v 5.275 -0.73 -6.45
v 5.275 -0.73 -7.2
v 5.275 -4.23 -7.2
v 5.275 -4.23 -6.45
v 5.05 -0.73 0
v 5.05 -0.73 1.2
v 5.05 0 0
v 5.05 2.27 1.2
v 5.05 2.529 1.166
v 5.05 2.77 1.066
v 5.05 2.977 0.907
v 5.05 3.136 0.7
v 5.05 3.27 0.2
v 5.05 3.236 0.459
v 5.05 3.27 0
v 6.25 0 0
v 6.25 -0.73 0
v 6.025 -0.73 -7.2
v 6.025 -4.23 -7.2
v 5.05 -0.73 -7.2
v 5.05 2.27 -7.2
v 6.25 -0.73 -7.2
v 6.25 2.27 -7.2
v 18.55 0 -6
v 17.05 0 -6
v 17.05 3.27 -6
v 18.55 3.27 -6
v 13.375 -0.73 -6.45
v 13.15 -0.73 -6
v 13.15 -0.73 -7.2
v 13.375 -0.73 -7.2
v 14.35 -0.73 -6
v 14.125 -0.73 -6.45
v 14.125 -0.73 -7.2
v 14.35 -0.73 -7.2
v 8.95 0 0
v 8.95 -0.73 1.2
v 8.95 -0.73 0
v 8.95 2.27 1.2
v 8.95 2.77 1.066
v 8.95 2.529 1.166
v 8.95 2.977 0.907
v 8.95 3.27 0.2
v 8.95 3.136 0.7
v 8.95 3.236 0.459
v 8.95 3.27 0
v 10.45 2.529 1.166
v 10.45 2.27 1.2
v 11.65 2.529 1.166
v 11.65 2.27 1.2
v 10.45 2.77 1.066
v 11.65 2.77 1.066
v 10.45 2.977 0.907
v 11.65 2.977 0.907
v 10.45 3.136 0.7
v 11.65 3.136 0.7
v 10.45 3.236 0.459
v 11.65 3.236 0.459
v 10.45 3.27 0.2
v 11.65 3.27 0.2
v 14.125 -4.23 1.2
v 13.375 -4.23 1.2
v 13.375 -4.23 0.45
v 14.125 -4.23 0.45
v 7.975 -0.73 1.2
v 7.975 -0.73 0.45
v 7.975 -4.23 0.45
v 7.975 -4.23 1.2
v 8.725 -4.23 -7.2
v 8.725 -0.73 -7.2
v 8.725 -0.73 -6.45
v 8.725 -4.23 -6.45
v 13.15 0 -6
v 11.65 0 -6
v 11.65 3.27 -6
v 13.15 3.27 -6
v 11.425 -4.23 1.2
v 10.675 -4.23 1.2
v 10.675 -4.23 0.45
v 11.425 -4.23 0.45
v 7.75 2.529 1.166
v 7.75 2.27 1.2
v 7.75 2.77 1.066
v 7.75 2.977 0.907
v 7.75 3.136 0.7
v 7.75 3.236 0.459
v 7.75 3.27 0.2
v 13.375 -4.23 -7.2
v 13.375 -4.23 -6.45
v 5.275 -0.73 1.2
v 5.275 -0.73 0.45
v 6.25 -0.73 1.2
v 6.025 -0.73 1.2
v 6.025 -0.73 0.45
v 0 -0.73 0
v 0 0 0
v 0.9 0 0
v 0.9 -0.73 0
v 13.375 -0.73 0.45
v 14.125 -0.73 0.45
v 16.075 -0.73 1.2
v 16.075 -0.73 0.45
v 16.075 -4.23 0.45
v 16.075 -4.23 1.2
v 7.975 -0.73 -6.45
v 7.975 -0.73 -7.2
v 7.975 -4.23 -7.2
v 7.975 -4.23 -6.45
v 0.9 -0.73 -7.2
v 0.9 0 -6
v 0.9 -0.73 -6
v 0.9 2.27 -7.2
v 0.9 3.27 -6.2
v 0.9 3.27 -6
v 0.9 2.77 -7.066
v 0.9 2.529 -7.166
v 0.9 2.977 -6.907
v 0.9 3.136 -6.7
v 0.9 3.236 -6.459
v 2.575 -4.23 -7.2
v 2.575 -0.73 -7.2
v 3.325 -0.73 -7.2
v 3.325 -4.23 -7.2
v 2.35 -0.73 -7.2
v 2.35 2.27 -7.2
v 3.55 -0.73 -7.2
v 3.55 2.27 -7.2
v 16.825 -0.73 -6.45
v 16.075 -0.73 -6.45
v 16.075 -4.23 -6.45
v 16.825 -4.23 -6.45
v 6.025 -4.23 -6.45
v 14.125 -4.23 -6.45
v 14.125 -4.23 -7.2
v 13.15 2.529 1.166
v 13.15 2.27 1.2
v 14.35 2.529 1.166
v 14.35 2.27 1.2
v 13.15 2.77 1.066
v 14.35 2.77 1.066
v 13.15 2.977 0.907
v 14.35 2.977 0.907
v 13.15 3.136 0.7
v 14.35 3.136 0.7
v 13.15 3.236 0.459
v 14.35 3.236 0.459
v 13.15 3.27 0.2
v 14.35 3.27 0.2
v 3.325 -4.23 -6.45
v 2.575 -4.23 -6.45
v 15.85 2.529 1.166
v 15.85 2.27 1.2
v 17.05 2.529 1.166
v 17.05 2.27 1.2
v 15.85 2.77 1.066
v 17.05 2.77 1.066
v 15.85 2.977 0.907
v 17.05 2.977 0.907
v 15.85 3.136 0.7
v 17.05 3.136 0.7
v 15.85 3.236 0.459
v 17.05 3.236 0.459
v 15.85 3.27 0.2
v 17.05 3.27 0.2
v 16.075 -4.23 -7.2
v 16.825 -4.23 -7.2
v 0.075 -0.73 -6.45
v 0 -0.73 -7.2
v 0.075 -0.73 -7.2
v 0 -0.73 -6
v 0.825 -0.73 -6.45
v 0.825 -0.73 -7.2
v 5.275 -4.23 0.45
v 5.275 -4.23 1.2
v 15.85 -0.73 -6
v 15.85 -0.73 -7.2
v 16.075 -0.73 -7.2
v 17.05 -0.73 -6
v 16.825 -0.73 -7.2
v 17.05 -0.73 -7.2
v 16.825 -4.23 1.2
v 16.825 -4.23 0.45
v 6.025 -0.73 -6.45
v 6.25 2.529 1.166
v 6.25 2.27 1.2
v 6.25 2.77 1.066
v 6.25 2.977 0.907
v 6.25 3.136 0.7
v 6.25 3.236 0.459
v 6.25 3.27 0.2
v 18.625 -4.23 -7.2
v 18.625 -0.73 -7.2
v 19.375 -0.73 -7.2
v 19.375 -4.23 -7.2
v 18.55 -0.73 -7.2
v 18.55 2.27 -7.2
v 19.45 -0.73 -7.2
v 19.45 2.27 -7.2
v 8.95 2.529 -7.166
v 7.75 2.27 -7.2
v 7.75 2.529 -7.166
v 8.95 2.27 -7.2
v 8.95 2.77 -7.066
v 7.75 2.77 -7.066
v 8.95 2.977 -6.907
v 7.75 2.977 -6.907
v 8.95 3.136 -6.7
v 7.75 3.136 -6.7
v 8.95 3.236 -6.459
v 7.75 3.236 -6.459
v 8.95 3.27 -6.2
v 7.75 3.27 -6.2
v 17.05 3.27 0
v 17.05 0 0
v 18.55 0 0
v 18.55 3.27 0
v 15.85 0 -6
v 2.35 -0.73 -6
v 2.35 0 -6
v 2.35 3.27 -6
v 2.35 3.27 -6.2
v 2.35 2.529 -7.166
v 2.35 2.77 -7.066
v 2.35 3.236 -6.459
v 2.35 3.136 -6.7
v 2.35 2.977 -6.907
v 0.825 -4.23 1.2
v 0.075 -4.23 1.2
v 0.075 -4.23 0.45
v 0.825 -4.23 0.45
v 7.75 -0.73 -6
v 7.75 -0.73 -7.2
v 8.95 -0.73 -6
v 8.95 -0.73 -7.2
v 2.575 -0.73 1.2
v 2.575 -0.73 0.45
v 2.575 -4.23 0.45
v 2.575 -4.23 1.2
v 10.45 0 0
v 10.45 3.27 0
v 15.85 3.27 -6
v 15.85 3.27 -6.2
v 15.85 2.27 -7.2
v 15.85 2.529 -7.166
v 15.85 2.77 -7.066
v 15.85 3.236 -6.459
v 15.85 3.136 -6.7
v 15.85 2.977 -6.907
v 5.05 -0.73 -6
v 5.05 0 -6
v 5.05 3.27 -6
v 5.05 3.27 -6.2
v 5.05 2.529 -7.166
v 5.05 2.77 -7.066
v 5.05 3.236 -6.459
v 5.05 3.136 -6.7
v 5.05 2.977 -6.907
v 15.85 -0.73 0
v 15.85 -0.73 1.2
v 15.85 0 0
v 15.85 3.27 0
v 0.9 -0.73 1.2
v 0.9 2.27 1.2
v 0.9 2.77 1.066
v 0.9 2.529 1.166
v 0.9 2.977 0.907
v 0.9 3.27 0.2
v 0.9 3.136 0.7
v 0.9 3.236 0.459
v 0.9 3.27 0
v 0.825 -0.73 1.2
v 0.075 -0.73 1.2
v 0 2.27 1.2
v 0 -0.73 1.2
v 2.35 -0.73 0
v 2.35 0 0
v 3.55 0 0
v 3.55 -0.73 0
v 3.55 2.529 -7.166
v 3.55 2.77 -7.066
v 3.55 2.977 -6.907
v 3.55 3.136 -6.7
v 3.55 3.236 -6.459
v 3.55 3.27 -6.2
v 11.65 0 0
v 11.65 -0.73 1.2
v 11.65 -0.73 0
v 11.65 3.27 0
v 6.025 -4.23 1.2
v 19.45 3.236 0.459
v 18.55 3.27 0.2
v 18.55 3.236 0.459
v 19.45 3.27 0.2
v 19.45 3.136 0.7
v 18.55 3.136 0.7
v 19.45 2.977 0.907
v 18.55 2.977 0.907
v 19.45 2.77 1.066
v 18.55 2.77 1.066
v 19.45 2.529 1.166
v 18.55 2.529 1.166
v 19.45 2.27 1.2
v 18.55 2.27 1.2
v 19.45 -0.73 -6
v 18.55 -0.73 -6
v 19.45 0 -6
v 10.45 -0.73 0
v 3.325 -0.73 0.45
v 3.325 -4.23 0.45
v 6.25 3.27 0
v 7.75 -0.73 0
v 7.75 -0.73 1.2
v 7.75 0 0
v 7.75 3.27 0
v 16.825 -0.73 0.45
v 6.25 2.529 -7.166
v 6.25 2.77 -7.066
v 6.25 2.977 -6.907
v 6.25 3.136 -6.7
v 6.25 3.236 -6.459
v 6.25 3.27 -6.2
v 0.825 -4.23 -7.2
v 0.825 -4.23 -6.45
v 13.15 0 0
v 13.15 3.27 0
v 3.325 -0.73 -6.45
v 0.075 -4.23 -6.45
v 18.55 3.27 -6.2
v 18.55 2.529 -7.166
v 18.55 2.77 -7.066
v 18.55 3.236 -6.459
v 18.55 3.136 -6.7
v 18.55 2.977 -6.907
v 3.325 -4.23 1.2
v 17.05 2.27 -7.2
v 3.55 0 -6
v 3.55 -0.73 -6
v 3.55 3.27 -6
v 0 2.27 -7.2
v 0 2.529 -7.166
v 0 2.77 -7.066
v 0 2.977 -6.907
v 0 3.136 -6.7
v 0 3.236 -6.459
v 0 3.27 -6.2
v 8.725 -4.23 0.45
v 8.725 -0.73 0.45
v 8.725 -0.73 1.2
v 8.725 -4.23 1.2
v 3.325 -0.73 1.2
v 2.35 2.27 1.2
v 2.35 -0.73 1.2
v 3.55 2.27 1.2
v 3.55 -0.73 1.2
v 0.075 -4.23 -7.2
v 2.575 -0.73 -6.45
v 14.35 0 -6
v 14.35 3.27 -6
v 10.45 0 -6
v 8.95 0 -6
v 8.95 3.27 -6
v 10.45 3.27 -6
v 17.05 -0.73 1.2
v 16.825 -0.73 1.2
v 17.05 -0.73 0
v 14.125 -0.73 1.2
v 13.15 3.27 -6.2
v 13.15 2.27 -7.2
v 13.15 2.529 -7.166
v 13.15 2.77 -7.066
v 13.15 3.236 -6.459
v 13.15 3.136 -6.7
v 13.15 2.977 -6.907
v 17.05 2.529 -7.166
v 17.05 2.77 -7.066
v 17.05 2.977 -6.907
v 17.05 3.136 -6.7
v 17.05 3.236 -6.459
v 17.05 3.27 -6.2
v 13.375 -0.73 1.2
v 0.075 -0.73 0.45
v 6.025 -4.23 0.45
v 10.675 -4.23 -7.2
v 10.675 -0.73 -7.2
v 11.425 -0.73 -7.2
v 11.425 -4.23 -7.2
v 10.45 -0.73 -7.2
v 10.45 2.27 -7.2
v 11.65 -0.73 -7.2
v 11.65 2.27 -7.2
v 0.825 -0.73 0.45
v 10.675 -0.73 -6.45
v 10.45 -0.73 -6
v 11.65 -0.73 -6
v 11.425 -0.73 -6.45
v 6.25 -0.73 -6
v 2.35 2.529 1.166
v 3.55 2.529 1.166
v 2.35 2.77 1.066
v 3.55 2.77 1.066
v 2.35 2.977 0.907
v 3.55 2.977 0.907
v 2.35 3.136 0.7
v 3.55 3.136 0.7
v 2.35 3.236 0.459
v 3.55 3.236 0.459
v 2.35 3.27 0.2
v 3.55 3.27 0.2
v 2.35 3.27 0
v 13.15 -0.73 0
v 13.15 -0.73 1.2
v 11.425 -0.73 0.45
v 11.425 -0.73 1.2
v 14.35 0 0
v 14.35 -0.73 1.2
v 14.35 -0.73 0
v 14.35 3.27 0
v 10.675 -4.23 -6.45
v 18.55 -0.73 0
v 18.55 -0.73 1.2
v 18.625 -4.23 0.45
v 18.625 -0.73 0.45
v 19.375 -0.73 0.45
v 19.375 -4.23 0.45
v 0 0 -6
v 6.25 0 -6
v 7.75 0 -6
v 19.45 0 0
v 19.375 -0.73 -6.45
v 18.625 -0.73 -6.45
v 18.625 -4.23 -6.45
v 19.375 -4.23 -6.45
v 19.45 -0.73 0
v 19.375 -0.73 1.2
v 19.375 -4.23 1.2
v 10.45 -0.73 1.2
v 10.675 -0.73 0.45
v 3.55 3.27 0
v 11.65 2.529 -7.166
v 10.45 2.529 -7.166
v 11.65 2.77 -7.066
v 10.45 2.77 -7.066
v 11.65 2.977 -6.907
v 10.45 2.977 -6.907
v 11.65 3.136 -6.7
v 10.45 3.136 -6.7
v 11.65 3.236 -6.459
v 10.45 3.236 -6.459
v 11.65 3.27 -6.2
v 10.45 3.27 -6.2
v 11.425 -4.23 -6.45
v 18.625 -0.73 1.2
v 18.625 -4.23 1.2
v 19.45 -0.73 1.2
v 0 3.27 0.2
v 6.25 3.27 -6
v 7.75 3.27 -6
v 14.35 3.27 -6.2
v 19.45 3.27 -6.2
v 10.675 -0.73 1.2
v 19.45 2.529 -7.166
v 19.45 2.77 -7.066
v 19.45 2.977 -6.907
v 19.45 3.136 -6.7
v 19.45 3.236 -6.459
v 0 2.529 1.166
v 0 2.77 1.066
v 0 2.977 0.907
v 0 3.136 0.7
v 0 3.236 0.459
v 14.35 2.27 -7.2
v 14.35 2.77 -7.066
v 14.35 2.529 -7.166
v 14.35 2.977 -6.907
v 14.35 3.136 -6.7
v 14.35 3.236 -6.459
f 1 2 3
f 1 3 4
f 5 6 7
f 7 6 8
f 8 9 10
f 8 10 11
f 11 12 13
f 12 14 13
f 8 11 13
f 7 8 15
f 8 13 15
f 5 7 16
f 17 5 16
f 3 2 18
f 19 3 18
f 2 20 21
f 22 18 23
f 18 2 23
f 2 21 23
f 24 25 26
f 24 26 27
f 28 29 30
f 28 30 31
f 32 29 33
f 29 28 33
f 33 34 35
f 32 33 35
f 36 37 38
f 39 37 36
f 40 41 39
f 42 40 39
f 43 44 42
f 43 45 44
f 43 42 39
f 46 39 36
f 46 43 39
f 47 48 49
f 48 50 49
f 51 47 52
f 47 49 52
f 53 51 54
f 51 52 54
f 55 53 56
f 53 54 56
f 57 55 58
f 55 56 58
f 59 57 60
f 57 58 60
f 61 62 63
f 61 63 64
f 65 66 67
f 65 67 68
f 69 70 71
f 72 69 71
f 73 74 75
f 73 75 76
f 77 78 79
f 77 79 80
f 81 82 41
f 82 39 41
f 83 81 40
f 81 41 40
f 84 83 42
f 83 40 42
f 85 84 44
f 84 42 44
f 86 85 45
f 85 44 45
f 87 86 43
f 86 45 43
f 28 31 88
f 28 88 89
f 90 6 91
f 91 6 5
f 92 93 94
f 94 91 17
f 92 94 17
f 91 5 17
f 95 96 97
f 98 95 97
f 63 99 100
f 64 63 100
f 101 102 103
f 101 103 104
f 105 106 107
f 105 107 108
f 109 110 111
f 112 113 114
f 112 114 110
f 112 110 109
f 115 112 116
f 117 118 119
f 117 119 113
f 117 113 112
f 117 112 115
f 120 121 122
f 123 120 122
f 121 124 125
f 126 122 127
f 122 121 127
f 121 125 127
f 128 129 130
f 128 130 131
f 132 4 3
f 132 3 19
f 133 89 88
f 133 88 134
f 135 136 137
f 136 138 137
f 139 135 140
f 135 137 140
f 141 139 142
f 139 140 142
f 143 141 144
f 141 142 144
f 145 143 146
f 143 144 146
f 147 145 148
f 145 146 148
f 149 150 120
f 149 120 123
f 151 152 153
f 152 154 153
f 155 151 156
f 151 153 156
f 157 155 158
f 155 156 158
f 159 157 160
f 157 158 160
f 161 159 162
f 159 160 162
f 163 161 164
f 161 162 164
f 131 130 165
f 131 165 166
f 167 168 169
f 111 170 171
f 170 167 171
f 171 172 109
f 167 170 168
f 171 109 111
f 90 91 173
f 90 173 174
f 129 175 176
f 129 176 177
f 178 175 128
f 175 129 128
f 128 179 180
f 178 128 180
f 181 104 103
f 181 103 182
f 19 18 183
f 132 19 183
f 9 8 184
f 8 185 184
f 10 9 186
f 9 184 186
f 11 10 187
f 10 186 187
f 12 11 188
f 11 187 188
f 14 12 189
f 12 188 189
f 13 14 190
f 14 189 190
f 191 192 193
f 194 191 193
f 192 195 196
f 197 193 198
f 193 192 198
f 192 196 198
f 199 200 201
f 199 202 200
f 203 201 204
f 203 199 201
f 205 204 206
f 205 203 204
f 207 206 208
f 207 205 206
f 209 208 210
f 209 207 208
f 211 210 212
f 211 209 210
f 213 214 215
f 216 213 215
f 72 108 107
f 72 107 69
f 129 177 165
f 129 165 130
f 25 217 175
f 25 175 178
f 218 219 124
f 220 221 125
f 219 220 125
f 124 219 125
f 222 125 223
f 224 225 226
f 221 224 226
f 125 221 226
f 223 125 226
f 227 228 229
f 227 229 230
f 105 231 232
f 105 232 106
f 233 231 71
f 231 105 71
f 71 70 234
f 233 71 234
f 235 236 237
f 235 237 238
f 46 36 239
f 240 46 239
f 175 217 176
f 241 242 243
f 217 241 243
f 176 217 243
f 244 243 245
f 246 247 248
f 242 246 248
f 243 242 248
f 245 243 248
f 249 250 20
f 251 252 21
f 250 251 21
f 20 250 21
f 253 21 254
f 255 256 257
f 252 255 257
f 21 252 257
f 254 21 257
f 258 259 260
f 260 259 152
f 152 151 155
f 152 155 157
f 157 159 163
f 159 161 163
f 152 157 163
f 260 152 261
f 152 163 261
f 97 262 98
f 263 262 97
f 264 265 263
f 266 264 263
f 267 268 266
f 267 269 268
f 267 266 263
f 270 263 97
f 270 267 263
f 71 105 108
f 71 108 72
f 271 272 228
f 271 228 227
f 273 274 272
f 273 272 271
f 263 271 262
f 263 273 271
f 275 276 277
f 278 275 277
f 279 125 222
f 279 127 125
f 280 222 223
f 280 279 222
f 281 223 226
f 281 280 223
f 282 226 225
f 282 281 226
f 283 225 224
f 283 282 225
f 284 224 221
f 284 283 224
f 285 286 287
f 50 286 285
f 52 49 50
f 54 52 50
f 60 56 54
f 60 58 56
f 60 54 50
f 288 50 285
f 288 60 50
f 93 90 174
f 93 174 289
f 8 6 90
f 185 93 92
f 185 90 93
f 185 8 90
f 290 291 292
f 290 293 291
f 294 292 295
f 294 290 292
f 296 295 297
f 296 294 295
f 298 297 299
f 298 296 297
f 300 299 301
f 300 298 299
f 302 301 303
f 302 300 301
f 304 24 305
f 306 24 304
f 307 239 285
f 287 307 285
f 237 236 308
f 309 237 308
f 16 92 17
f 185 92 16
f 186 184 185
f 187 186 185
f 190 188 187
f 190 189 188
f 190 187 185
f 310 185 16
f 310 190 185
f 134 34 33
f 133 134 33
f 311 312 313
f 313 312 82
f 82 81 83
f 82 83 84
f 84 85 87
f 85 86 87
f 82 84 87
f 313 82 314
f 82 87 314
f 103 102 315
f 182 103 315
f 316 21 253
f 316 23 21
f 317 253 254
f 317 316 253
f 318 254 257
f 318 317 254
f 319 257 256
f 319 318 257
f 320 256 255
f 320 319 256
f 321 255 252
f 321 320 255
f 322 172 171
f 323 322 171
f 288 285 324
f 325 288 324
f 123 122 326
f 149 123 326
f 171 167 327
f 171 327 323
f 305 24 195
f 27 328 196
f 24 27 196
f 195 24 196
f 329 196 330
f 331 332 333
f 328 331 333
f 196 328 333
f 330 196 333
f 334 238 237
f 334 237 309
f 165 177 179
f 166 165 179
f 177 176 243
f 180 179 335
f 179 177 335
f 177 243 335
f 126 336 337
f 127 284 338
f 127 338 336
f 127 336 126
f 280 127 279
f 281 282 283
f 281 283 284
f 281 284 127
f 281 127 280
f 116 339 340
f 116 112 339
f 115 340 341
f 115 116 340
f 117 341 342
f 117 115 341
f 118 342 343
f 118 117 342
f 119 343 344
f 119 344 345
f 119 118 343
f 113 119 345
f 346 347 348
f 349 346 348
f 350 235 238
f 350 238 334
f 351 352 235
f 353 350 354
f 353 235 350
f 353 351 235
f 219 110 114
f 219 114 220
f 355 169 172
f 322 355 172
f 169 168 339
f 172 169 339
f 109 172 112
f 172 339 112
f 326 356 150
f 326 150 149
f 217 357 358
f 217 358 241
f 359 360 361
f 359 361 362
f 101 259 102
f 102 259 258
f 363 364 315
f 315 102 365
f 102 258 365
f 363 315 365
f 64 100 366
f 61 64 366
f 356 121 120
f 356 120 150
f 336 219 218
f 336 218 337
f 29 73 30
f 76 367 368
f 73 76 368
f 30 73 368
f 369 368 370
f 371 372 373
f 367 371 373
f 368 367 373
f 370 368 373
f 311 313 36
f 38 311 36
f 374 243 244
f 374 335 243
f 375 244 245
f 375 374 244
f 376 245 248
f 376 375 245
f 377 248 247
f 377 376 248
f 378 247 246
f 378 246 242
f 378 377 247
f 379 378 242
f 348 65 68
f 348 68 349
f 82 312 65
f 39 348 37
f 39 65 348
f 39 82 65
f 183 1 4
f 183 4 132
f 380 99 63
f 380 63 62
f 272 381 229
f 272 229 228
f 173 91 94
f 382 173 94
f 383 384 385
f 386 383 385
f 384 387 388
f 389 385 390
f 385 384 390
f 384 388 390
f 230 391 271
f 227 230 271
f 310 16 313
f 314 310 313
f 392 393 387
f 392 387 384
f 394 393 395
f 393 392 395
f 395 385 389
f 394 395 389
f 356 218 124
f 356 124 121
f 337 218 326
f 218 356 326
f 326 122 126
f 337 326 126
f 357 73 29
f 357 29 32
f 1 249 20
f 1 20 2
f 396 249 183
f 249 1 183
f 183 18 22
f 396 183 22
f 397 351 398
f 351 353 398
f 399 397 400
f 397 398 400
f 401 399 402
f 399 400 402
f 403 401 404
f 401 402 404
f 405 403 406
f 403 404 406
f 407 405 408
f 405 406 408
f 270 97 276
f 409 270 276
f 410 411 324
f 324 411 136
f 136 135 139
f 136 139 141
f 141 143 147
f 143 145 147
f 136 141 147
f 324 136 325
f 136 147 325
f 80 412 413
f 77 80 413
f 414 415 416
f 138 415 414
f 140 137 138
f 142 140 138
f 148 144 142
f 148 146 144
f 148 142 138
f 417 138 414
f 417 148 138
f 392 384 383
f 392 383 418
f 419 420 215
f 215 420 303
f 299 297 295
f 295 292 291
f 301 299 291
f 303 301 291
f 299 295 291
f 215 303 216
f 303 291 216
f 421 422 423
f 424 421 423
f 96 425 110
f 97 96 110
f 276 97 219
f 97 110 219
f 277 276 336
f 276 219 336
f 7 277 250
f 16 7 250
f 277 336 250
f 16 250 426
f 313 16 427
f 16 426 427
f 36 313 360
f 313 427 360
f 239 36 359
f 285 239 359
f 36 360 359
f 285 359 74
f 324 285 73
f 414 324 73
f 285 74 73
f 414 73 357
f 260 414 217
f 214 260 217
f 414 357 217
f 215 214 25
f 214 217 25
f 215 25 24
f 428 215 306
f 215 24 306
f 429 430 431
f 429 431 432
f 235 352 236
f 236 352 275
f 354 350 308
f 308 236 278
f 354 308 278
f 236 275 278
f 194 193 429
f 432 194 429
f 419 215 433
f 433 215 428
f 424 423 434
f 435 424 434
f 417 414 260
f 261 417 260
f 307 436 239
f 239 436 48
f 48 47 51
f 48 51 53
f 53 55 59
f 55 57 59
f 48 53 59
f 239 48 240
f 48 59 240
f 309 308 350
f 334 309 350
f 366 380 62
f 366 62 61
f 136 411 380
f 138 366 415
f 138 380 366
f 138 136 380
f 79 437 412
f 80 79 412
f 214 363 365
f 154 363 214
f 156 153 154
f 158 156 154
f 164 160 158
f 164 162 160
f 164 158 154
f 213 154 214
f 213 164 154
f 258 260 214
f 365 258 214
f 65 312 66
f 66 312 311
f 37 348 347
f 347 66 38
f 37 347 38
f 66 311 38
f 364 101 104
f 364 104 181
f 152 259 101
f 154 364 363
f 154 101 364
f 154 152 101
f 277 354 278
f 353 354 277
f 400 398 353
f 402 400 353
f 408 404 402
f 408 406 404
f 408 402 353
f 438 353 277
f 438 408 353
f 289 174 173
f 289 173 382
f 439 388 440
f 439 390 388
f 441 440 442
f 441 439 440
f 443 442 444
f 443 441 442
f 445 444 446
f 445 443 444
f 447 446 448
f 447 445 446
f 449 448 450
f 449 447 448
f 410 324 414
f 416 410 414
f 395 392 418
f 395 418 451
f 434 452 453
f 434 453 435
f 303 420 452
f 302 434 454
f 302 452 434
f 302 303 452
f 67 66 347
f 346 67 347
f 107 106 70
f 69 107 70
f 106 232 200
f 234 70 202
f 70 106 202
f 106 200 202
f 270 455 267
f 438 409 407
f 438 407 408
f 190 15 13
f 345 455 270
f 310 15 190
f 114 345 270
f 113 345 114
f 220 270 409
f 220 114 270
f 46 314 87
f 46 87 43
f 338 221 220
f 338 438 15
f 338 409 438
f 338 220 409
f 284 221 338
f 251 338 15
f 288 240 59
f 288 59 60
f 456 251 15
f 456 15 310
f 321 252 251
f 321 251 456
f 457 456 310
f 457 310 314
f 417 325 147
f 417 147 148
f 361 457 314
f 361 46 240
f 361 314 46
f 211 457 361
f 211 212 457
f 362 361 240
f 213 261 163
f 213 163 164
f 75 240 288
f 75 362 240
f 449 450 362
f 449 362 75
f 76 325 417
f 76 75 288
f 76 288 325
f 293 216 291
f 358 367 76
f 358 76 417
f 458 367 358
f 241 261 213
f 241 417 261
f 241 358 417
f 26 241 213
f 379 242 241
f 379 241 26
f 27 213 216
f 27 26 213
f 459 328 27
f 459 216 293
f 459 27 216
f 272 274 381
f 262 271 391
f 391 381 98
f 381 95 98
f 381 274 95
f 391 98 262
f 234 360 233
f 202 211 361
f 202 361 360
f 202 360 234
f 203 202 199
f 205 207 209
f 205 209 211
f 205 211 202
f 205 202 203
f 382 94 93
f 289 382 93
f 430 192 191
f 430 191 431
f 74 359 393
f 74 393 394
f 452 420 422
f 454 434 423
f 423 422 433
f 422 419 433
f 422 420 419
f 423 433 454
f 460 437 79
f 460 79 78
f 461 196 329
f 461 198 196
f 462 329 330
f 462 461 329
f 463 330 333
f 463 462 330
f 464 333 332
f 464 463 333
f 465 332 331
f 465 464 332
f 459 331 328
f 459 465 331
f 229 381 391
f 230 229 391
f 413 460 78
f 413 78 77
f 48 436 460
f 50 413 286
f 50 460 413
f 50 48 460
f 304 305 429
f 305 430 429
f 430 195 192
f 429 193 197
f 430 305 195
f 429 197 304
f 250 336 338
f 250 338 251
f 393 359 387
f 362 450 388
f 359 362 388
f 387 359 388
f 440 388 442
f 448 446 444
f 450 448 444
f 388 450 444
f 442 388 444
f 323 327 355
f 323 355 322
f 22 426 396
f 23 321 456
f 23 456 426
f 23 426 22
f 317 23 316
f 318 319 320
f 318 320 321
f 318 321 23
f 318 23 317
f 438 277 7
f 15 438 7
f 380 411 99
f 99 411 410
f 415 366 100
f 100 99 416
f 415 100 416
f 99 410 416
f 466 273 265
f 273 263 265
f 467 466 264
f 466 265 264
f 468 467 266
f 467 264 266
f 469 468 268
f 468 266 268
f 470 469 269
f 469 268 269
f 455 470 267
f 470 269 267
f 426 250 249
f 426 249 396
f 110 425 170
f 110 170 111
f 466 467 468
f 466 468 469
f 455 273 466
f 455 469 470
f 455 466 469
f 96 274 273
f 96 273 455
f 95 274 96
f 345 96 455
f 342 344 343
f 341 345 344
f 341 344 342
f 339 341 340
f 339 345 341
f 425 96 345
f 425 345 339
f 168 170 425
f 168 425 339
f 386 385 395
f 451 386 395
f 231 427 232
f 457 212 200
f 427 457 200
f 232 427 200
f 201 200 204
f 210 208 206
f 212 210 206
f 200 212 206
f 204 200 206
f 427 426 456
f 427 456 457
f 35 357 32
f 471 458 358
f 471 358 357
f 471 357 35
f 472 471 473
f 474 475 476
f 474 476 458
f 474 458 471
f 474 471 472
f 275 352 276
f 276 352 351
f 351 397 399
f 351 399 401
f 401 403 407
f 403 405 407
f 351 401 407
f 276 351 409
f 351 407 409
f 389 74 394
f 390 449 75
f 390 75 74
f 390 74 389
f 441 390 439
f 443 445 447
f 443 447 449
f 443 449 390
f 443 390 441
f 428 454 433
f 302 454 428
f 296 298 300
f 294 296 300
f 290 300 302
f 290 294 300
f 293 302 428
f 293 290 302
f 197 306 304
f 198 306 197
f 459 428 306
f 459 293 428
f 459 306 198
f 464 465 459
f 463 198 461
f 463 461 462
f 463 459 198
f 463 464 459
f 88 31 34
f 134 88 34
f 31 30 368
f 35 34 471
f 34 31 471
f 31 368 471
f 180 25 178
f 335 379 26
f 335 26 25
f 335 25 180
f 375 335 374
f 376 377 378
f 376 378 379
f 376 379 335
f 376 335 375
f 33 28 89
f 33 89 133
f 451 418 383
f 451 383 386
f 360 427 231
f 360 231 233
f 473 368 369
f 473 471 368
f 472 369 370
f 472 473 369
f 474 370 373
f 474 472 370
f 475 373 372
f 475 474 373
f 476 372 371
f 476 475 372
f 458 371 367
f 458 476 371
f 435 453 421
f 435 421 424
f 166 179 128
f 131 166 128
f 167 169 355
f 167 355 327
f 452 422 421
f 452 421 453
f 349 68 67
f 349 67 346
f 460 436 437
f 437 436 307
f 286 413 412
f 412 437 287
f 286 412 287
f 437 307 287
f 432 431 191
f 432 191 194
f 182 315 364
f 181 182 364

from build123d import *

# Parameters (mm, degrees)
SKETCH1_W           = 19.45
SKETCH1_H           = 6
BOSS_EXTRUDE1_DEPTH = 3.27
SKETCH2_W           = 0.9
SKETCH2_H           = 1.2
SKETCH2_W_2         = 1.2
BOSS_EXTRUDE2_DEPTH = 4
FILLET1_R           = 1
SKETCH3_W           = 0.75
SKETCH3_H           = 0.75
BOSS_EXTRUDE3_DEPTH = 3.5


with BuildPart() as part:
    # Sketch1 → Boss-Extrude1 (new body)
    with BuildSketch(Plane(origin=(0, 0, 0), x_dir=(1, 0, 0), z_dir=(0, 1, 0))):
        with Locations((9.725, 3)):
            Rectangle(SKETCH1_W, SKETCH1_H)
    extrude(amount=BOSS_EXTRUDE1_DEPTH)

    # Sketch2 → Boss-Extrude2 (add)
    with BuildSketch(Plane(origin=(0, 3.27, 0), x_dir=(1, 0, 0), z_dir=(0, 1, 0))):
        with Locations((19, -0.6)):
            Rectangle(SKETCH2_W, SKETCH2_H)
        with Locations((16.45, -0.6)):
            Rectangle(SKETCH2_W_2, SKETCH2_H)
        with Locations((13.75, -0.6)):
            Rectangle(SKETCH2_W_2, SKETCH2_H)
        with Locations((11.05, -0.6)):
            Rectangle(SKETCH2_W_2, SKETCH2_H)
        with Locations((8.35, -0.6)):
            Rectangle(SKETCH2_W_2, SKETCH2_H)
        with Locations((5.65, -0.6)):
            Rectangle(SKETCH2_W_2, SKETCH2_H)
        with Locations((2.95, -0.6)):
            Rectangle(SKETCH2_W_2, SKETCH2_H)
        with Locations((0.45, -0.6)):
            Rectangle(SKETCH2_W, SKETCH2_H)
        with Locations((0.45, 6.6)):
            Rectangle(SKETCH2_W, SKETCH2_H)
        with Locations((2.95, 6.6)):
            Rectangle(SKETCH2_W_2, SKETCH2_H)
        with Locations((5.65, 6.6)):
            Rectangle(SKETCH2_W_2, SKETCH2_H)
        with Locations((8.35, 6.6)):
            Rectangle(SKETCH2_W_2, SKETCH2_H)
        with Locations((11.05, 6.6)):
            Rectangle(SKETCH2_W_2, SKETCH2_H)
        with Locations((13.75, 6.6)):
            Rectangle(SKETCH2_W_2, SKETCH2_H)
        with Locations((16.45, 6.6)):
            Rectangle(SKETCH2_W_2, SKETCH2_H)
        with Locations((19, 6.6)):
            Rectangle(SKETCH2_W, SKETCH2_H)
    extrude(amount=-BOSS_EXTRUDE2_DEPTH)

    # Fillet1
    fillet1_edges = [part.edges().sort_by_distance(p)[0] for p in [
        (0.45, 3.27, 1.2),
        (0.45, 3.27, -7.2),
        (2.95, 3.27, -7.2),
        (5.65, 3.27, -7.2),
        (8.35, 3.27, -7.2),
        (19, 3.27, 1.2),
        (11.05, 3.27, -7.2),
        (13.75, 3.27, -7.2),
        (16.45, 3.27, -7.2),
        (19, 3.27, -7.2),
        (16.45, 3.27, 1.2),
        (13.75, 3.27, 1.2),
        (11.05, 3.27, 1.2),
        (8.35, 3.27, 1.2),
        (5.65, 3.27, 1.2),
        (2.95, 3.27, 1.2),
    ]]
    fillet(fillet1_edges, radius=FILLET1_R)

    # Sketch3 → Boss-Extrude3 (add)
    with BuildSketch(Plane.XZ.offset(0.73)):
        with Locations((19, 0.825)):
            Rectangle(SKETCH3_W, SKETCH3_H)
        with Locations((16.45, 0.825)):
            Rectangle(SKETCH3_W, SKETCH3_H)
        with Locations((13.75, 0.825)):
            Rectangle(SKETCH3_W, SKETCH3_H)
        with Locations((11.05, 0.825)):
            Rectangle(SKETCH3_W, SKETCH3_H)
        with Locations((8.35, 0.825)):
            Rectangle(SKETCH3_W, SKETCH3_H)
        with Locations((5.65, 0.825)):
            Rectangle(SKETCH3_W, SKETCH3_H)
        with Locations((2.95, 0.825)):
            Rectangle(SKETCH3_W, SKETCH3_H)
        with Locations((0.45, 0.825)):
            Rectangle(SKETCH3_W, SKETCH3_H)
        with Locations((0.45, -6.825)):
            Rectangle(SKETCH3_W, SKETCH3_H)
        with Locations((2.95, -6.825)):
            Rectangle(SKETCH3_W, SKETCH3_H)
        with Locations((5.65, -6.825)):
            Rectangle(SKETCH3_W, SKETCH3_H)
        with Locations((11.05, -6.825)):
            Rectangle(SKETCH3_W, SKETCH3_H)
        with Locations((8.35, -6.825)):
            Rectangle(SKETCH3_W, SKETCH3_H)
        with Locations((13.75, -6.825)):
            Rectangle(SKETCH3_W, SKETCH3_H)
        with Locations((16.45, -6.825)):
            Rectangle(SKETCH3_W, SKETCH3_H)
        with Locations((19, -6.825)):
            Rectangle(SKETCH3_W, SKETCH3_H)
    extrude(amount=BOSS_EXTRUDE3_DEPTH)


solid = part.part
